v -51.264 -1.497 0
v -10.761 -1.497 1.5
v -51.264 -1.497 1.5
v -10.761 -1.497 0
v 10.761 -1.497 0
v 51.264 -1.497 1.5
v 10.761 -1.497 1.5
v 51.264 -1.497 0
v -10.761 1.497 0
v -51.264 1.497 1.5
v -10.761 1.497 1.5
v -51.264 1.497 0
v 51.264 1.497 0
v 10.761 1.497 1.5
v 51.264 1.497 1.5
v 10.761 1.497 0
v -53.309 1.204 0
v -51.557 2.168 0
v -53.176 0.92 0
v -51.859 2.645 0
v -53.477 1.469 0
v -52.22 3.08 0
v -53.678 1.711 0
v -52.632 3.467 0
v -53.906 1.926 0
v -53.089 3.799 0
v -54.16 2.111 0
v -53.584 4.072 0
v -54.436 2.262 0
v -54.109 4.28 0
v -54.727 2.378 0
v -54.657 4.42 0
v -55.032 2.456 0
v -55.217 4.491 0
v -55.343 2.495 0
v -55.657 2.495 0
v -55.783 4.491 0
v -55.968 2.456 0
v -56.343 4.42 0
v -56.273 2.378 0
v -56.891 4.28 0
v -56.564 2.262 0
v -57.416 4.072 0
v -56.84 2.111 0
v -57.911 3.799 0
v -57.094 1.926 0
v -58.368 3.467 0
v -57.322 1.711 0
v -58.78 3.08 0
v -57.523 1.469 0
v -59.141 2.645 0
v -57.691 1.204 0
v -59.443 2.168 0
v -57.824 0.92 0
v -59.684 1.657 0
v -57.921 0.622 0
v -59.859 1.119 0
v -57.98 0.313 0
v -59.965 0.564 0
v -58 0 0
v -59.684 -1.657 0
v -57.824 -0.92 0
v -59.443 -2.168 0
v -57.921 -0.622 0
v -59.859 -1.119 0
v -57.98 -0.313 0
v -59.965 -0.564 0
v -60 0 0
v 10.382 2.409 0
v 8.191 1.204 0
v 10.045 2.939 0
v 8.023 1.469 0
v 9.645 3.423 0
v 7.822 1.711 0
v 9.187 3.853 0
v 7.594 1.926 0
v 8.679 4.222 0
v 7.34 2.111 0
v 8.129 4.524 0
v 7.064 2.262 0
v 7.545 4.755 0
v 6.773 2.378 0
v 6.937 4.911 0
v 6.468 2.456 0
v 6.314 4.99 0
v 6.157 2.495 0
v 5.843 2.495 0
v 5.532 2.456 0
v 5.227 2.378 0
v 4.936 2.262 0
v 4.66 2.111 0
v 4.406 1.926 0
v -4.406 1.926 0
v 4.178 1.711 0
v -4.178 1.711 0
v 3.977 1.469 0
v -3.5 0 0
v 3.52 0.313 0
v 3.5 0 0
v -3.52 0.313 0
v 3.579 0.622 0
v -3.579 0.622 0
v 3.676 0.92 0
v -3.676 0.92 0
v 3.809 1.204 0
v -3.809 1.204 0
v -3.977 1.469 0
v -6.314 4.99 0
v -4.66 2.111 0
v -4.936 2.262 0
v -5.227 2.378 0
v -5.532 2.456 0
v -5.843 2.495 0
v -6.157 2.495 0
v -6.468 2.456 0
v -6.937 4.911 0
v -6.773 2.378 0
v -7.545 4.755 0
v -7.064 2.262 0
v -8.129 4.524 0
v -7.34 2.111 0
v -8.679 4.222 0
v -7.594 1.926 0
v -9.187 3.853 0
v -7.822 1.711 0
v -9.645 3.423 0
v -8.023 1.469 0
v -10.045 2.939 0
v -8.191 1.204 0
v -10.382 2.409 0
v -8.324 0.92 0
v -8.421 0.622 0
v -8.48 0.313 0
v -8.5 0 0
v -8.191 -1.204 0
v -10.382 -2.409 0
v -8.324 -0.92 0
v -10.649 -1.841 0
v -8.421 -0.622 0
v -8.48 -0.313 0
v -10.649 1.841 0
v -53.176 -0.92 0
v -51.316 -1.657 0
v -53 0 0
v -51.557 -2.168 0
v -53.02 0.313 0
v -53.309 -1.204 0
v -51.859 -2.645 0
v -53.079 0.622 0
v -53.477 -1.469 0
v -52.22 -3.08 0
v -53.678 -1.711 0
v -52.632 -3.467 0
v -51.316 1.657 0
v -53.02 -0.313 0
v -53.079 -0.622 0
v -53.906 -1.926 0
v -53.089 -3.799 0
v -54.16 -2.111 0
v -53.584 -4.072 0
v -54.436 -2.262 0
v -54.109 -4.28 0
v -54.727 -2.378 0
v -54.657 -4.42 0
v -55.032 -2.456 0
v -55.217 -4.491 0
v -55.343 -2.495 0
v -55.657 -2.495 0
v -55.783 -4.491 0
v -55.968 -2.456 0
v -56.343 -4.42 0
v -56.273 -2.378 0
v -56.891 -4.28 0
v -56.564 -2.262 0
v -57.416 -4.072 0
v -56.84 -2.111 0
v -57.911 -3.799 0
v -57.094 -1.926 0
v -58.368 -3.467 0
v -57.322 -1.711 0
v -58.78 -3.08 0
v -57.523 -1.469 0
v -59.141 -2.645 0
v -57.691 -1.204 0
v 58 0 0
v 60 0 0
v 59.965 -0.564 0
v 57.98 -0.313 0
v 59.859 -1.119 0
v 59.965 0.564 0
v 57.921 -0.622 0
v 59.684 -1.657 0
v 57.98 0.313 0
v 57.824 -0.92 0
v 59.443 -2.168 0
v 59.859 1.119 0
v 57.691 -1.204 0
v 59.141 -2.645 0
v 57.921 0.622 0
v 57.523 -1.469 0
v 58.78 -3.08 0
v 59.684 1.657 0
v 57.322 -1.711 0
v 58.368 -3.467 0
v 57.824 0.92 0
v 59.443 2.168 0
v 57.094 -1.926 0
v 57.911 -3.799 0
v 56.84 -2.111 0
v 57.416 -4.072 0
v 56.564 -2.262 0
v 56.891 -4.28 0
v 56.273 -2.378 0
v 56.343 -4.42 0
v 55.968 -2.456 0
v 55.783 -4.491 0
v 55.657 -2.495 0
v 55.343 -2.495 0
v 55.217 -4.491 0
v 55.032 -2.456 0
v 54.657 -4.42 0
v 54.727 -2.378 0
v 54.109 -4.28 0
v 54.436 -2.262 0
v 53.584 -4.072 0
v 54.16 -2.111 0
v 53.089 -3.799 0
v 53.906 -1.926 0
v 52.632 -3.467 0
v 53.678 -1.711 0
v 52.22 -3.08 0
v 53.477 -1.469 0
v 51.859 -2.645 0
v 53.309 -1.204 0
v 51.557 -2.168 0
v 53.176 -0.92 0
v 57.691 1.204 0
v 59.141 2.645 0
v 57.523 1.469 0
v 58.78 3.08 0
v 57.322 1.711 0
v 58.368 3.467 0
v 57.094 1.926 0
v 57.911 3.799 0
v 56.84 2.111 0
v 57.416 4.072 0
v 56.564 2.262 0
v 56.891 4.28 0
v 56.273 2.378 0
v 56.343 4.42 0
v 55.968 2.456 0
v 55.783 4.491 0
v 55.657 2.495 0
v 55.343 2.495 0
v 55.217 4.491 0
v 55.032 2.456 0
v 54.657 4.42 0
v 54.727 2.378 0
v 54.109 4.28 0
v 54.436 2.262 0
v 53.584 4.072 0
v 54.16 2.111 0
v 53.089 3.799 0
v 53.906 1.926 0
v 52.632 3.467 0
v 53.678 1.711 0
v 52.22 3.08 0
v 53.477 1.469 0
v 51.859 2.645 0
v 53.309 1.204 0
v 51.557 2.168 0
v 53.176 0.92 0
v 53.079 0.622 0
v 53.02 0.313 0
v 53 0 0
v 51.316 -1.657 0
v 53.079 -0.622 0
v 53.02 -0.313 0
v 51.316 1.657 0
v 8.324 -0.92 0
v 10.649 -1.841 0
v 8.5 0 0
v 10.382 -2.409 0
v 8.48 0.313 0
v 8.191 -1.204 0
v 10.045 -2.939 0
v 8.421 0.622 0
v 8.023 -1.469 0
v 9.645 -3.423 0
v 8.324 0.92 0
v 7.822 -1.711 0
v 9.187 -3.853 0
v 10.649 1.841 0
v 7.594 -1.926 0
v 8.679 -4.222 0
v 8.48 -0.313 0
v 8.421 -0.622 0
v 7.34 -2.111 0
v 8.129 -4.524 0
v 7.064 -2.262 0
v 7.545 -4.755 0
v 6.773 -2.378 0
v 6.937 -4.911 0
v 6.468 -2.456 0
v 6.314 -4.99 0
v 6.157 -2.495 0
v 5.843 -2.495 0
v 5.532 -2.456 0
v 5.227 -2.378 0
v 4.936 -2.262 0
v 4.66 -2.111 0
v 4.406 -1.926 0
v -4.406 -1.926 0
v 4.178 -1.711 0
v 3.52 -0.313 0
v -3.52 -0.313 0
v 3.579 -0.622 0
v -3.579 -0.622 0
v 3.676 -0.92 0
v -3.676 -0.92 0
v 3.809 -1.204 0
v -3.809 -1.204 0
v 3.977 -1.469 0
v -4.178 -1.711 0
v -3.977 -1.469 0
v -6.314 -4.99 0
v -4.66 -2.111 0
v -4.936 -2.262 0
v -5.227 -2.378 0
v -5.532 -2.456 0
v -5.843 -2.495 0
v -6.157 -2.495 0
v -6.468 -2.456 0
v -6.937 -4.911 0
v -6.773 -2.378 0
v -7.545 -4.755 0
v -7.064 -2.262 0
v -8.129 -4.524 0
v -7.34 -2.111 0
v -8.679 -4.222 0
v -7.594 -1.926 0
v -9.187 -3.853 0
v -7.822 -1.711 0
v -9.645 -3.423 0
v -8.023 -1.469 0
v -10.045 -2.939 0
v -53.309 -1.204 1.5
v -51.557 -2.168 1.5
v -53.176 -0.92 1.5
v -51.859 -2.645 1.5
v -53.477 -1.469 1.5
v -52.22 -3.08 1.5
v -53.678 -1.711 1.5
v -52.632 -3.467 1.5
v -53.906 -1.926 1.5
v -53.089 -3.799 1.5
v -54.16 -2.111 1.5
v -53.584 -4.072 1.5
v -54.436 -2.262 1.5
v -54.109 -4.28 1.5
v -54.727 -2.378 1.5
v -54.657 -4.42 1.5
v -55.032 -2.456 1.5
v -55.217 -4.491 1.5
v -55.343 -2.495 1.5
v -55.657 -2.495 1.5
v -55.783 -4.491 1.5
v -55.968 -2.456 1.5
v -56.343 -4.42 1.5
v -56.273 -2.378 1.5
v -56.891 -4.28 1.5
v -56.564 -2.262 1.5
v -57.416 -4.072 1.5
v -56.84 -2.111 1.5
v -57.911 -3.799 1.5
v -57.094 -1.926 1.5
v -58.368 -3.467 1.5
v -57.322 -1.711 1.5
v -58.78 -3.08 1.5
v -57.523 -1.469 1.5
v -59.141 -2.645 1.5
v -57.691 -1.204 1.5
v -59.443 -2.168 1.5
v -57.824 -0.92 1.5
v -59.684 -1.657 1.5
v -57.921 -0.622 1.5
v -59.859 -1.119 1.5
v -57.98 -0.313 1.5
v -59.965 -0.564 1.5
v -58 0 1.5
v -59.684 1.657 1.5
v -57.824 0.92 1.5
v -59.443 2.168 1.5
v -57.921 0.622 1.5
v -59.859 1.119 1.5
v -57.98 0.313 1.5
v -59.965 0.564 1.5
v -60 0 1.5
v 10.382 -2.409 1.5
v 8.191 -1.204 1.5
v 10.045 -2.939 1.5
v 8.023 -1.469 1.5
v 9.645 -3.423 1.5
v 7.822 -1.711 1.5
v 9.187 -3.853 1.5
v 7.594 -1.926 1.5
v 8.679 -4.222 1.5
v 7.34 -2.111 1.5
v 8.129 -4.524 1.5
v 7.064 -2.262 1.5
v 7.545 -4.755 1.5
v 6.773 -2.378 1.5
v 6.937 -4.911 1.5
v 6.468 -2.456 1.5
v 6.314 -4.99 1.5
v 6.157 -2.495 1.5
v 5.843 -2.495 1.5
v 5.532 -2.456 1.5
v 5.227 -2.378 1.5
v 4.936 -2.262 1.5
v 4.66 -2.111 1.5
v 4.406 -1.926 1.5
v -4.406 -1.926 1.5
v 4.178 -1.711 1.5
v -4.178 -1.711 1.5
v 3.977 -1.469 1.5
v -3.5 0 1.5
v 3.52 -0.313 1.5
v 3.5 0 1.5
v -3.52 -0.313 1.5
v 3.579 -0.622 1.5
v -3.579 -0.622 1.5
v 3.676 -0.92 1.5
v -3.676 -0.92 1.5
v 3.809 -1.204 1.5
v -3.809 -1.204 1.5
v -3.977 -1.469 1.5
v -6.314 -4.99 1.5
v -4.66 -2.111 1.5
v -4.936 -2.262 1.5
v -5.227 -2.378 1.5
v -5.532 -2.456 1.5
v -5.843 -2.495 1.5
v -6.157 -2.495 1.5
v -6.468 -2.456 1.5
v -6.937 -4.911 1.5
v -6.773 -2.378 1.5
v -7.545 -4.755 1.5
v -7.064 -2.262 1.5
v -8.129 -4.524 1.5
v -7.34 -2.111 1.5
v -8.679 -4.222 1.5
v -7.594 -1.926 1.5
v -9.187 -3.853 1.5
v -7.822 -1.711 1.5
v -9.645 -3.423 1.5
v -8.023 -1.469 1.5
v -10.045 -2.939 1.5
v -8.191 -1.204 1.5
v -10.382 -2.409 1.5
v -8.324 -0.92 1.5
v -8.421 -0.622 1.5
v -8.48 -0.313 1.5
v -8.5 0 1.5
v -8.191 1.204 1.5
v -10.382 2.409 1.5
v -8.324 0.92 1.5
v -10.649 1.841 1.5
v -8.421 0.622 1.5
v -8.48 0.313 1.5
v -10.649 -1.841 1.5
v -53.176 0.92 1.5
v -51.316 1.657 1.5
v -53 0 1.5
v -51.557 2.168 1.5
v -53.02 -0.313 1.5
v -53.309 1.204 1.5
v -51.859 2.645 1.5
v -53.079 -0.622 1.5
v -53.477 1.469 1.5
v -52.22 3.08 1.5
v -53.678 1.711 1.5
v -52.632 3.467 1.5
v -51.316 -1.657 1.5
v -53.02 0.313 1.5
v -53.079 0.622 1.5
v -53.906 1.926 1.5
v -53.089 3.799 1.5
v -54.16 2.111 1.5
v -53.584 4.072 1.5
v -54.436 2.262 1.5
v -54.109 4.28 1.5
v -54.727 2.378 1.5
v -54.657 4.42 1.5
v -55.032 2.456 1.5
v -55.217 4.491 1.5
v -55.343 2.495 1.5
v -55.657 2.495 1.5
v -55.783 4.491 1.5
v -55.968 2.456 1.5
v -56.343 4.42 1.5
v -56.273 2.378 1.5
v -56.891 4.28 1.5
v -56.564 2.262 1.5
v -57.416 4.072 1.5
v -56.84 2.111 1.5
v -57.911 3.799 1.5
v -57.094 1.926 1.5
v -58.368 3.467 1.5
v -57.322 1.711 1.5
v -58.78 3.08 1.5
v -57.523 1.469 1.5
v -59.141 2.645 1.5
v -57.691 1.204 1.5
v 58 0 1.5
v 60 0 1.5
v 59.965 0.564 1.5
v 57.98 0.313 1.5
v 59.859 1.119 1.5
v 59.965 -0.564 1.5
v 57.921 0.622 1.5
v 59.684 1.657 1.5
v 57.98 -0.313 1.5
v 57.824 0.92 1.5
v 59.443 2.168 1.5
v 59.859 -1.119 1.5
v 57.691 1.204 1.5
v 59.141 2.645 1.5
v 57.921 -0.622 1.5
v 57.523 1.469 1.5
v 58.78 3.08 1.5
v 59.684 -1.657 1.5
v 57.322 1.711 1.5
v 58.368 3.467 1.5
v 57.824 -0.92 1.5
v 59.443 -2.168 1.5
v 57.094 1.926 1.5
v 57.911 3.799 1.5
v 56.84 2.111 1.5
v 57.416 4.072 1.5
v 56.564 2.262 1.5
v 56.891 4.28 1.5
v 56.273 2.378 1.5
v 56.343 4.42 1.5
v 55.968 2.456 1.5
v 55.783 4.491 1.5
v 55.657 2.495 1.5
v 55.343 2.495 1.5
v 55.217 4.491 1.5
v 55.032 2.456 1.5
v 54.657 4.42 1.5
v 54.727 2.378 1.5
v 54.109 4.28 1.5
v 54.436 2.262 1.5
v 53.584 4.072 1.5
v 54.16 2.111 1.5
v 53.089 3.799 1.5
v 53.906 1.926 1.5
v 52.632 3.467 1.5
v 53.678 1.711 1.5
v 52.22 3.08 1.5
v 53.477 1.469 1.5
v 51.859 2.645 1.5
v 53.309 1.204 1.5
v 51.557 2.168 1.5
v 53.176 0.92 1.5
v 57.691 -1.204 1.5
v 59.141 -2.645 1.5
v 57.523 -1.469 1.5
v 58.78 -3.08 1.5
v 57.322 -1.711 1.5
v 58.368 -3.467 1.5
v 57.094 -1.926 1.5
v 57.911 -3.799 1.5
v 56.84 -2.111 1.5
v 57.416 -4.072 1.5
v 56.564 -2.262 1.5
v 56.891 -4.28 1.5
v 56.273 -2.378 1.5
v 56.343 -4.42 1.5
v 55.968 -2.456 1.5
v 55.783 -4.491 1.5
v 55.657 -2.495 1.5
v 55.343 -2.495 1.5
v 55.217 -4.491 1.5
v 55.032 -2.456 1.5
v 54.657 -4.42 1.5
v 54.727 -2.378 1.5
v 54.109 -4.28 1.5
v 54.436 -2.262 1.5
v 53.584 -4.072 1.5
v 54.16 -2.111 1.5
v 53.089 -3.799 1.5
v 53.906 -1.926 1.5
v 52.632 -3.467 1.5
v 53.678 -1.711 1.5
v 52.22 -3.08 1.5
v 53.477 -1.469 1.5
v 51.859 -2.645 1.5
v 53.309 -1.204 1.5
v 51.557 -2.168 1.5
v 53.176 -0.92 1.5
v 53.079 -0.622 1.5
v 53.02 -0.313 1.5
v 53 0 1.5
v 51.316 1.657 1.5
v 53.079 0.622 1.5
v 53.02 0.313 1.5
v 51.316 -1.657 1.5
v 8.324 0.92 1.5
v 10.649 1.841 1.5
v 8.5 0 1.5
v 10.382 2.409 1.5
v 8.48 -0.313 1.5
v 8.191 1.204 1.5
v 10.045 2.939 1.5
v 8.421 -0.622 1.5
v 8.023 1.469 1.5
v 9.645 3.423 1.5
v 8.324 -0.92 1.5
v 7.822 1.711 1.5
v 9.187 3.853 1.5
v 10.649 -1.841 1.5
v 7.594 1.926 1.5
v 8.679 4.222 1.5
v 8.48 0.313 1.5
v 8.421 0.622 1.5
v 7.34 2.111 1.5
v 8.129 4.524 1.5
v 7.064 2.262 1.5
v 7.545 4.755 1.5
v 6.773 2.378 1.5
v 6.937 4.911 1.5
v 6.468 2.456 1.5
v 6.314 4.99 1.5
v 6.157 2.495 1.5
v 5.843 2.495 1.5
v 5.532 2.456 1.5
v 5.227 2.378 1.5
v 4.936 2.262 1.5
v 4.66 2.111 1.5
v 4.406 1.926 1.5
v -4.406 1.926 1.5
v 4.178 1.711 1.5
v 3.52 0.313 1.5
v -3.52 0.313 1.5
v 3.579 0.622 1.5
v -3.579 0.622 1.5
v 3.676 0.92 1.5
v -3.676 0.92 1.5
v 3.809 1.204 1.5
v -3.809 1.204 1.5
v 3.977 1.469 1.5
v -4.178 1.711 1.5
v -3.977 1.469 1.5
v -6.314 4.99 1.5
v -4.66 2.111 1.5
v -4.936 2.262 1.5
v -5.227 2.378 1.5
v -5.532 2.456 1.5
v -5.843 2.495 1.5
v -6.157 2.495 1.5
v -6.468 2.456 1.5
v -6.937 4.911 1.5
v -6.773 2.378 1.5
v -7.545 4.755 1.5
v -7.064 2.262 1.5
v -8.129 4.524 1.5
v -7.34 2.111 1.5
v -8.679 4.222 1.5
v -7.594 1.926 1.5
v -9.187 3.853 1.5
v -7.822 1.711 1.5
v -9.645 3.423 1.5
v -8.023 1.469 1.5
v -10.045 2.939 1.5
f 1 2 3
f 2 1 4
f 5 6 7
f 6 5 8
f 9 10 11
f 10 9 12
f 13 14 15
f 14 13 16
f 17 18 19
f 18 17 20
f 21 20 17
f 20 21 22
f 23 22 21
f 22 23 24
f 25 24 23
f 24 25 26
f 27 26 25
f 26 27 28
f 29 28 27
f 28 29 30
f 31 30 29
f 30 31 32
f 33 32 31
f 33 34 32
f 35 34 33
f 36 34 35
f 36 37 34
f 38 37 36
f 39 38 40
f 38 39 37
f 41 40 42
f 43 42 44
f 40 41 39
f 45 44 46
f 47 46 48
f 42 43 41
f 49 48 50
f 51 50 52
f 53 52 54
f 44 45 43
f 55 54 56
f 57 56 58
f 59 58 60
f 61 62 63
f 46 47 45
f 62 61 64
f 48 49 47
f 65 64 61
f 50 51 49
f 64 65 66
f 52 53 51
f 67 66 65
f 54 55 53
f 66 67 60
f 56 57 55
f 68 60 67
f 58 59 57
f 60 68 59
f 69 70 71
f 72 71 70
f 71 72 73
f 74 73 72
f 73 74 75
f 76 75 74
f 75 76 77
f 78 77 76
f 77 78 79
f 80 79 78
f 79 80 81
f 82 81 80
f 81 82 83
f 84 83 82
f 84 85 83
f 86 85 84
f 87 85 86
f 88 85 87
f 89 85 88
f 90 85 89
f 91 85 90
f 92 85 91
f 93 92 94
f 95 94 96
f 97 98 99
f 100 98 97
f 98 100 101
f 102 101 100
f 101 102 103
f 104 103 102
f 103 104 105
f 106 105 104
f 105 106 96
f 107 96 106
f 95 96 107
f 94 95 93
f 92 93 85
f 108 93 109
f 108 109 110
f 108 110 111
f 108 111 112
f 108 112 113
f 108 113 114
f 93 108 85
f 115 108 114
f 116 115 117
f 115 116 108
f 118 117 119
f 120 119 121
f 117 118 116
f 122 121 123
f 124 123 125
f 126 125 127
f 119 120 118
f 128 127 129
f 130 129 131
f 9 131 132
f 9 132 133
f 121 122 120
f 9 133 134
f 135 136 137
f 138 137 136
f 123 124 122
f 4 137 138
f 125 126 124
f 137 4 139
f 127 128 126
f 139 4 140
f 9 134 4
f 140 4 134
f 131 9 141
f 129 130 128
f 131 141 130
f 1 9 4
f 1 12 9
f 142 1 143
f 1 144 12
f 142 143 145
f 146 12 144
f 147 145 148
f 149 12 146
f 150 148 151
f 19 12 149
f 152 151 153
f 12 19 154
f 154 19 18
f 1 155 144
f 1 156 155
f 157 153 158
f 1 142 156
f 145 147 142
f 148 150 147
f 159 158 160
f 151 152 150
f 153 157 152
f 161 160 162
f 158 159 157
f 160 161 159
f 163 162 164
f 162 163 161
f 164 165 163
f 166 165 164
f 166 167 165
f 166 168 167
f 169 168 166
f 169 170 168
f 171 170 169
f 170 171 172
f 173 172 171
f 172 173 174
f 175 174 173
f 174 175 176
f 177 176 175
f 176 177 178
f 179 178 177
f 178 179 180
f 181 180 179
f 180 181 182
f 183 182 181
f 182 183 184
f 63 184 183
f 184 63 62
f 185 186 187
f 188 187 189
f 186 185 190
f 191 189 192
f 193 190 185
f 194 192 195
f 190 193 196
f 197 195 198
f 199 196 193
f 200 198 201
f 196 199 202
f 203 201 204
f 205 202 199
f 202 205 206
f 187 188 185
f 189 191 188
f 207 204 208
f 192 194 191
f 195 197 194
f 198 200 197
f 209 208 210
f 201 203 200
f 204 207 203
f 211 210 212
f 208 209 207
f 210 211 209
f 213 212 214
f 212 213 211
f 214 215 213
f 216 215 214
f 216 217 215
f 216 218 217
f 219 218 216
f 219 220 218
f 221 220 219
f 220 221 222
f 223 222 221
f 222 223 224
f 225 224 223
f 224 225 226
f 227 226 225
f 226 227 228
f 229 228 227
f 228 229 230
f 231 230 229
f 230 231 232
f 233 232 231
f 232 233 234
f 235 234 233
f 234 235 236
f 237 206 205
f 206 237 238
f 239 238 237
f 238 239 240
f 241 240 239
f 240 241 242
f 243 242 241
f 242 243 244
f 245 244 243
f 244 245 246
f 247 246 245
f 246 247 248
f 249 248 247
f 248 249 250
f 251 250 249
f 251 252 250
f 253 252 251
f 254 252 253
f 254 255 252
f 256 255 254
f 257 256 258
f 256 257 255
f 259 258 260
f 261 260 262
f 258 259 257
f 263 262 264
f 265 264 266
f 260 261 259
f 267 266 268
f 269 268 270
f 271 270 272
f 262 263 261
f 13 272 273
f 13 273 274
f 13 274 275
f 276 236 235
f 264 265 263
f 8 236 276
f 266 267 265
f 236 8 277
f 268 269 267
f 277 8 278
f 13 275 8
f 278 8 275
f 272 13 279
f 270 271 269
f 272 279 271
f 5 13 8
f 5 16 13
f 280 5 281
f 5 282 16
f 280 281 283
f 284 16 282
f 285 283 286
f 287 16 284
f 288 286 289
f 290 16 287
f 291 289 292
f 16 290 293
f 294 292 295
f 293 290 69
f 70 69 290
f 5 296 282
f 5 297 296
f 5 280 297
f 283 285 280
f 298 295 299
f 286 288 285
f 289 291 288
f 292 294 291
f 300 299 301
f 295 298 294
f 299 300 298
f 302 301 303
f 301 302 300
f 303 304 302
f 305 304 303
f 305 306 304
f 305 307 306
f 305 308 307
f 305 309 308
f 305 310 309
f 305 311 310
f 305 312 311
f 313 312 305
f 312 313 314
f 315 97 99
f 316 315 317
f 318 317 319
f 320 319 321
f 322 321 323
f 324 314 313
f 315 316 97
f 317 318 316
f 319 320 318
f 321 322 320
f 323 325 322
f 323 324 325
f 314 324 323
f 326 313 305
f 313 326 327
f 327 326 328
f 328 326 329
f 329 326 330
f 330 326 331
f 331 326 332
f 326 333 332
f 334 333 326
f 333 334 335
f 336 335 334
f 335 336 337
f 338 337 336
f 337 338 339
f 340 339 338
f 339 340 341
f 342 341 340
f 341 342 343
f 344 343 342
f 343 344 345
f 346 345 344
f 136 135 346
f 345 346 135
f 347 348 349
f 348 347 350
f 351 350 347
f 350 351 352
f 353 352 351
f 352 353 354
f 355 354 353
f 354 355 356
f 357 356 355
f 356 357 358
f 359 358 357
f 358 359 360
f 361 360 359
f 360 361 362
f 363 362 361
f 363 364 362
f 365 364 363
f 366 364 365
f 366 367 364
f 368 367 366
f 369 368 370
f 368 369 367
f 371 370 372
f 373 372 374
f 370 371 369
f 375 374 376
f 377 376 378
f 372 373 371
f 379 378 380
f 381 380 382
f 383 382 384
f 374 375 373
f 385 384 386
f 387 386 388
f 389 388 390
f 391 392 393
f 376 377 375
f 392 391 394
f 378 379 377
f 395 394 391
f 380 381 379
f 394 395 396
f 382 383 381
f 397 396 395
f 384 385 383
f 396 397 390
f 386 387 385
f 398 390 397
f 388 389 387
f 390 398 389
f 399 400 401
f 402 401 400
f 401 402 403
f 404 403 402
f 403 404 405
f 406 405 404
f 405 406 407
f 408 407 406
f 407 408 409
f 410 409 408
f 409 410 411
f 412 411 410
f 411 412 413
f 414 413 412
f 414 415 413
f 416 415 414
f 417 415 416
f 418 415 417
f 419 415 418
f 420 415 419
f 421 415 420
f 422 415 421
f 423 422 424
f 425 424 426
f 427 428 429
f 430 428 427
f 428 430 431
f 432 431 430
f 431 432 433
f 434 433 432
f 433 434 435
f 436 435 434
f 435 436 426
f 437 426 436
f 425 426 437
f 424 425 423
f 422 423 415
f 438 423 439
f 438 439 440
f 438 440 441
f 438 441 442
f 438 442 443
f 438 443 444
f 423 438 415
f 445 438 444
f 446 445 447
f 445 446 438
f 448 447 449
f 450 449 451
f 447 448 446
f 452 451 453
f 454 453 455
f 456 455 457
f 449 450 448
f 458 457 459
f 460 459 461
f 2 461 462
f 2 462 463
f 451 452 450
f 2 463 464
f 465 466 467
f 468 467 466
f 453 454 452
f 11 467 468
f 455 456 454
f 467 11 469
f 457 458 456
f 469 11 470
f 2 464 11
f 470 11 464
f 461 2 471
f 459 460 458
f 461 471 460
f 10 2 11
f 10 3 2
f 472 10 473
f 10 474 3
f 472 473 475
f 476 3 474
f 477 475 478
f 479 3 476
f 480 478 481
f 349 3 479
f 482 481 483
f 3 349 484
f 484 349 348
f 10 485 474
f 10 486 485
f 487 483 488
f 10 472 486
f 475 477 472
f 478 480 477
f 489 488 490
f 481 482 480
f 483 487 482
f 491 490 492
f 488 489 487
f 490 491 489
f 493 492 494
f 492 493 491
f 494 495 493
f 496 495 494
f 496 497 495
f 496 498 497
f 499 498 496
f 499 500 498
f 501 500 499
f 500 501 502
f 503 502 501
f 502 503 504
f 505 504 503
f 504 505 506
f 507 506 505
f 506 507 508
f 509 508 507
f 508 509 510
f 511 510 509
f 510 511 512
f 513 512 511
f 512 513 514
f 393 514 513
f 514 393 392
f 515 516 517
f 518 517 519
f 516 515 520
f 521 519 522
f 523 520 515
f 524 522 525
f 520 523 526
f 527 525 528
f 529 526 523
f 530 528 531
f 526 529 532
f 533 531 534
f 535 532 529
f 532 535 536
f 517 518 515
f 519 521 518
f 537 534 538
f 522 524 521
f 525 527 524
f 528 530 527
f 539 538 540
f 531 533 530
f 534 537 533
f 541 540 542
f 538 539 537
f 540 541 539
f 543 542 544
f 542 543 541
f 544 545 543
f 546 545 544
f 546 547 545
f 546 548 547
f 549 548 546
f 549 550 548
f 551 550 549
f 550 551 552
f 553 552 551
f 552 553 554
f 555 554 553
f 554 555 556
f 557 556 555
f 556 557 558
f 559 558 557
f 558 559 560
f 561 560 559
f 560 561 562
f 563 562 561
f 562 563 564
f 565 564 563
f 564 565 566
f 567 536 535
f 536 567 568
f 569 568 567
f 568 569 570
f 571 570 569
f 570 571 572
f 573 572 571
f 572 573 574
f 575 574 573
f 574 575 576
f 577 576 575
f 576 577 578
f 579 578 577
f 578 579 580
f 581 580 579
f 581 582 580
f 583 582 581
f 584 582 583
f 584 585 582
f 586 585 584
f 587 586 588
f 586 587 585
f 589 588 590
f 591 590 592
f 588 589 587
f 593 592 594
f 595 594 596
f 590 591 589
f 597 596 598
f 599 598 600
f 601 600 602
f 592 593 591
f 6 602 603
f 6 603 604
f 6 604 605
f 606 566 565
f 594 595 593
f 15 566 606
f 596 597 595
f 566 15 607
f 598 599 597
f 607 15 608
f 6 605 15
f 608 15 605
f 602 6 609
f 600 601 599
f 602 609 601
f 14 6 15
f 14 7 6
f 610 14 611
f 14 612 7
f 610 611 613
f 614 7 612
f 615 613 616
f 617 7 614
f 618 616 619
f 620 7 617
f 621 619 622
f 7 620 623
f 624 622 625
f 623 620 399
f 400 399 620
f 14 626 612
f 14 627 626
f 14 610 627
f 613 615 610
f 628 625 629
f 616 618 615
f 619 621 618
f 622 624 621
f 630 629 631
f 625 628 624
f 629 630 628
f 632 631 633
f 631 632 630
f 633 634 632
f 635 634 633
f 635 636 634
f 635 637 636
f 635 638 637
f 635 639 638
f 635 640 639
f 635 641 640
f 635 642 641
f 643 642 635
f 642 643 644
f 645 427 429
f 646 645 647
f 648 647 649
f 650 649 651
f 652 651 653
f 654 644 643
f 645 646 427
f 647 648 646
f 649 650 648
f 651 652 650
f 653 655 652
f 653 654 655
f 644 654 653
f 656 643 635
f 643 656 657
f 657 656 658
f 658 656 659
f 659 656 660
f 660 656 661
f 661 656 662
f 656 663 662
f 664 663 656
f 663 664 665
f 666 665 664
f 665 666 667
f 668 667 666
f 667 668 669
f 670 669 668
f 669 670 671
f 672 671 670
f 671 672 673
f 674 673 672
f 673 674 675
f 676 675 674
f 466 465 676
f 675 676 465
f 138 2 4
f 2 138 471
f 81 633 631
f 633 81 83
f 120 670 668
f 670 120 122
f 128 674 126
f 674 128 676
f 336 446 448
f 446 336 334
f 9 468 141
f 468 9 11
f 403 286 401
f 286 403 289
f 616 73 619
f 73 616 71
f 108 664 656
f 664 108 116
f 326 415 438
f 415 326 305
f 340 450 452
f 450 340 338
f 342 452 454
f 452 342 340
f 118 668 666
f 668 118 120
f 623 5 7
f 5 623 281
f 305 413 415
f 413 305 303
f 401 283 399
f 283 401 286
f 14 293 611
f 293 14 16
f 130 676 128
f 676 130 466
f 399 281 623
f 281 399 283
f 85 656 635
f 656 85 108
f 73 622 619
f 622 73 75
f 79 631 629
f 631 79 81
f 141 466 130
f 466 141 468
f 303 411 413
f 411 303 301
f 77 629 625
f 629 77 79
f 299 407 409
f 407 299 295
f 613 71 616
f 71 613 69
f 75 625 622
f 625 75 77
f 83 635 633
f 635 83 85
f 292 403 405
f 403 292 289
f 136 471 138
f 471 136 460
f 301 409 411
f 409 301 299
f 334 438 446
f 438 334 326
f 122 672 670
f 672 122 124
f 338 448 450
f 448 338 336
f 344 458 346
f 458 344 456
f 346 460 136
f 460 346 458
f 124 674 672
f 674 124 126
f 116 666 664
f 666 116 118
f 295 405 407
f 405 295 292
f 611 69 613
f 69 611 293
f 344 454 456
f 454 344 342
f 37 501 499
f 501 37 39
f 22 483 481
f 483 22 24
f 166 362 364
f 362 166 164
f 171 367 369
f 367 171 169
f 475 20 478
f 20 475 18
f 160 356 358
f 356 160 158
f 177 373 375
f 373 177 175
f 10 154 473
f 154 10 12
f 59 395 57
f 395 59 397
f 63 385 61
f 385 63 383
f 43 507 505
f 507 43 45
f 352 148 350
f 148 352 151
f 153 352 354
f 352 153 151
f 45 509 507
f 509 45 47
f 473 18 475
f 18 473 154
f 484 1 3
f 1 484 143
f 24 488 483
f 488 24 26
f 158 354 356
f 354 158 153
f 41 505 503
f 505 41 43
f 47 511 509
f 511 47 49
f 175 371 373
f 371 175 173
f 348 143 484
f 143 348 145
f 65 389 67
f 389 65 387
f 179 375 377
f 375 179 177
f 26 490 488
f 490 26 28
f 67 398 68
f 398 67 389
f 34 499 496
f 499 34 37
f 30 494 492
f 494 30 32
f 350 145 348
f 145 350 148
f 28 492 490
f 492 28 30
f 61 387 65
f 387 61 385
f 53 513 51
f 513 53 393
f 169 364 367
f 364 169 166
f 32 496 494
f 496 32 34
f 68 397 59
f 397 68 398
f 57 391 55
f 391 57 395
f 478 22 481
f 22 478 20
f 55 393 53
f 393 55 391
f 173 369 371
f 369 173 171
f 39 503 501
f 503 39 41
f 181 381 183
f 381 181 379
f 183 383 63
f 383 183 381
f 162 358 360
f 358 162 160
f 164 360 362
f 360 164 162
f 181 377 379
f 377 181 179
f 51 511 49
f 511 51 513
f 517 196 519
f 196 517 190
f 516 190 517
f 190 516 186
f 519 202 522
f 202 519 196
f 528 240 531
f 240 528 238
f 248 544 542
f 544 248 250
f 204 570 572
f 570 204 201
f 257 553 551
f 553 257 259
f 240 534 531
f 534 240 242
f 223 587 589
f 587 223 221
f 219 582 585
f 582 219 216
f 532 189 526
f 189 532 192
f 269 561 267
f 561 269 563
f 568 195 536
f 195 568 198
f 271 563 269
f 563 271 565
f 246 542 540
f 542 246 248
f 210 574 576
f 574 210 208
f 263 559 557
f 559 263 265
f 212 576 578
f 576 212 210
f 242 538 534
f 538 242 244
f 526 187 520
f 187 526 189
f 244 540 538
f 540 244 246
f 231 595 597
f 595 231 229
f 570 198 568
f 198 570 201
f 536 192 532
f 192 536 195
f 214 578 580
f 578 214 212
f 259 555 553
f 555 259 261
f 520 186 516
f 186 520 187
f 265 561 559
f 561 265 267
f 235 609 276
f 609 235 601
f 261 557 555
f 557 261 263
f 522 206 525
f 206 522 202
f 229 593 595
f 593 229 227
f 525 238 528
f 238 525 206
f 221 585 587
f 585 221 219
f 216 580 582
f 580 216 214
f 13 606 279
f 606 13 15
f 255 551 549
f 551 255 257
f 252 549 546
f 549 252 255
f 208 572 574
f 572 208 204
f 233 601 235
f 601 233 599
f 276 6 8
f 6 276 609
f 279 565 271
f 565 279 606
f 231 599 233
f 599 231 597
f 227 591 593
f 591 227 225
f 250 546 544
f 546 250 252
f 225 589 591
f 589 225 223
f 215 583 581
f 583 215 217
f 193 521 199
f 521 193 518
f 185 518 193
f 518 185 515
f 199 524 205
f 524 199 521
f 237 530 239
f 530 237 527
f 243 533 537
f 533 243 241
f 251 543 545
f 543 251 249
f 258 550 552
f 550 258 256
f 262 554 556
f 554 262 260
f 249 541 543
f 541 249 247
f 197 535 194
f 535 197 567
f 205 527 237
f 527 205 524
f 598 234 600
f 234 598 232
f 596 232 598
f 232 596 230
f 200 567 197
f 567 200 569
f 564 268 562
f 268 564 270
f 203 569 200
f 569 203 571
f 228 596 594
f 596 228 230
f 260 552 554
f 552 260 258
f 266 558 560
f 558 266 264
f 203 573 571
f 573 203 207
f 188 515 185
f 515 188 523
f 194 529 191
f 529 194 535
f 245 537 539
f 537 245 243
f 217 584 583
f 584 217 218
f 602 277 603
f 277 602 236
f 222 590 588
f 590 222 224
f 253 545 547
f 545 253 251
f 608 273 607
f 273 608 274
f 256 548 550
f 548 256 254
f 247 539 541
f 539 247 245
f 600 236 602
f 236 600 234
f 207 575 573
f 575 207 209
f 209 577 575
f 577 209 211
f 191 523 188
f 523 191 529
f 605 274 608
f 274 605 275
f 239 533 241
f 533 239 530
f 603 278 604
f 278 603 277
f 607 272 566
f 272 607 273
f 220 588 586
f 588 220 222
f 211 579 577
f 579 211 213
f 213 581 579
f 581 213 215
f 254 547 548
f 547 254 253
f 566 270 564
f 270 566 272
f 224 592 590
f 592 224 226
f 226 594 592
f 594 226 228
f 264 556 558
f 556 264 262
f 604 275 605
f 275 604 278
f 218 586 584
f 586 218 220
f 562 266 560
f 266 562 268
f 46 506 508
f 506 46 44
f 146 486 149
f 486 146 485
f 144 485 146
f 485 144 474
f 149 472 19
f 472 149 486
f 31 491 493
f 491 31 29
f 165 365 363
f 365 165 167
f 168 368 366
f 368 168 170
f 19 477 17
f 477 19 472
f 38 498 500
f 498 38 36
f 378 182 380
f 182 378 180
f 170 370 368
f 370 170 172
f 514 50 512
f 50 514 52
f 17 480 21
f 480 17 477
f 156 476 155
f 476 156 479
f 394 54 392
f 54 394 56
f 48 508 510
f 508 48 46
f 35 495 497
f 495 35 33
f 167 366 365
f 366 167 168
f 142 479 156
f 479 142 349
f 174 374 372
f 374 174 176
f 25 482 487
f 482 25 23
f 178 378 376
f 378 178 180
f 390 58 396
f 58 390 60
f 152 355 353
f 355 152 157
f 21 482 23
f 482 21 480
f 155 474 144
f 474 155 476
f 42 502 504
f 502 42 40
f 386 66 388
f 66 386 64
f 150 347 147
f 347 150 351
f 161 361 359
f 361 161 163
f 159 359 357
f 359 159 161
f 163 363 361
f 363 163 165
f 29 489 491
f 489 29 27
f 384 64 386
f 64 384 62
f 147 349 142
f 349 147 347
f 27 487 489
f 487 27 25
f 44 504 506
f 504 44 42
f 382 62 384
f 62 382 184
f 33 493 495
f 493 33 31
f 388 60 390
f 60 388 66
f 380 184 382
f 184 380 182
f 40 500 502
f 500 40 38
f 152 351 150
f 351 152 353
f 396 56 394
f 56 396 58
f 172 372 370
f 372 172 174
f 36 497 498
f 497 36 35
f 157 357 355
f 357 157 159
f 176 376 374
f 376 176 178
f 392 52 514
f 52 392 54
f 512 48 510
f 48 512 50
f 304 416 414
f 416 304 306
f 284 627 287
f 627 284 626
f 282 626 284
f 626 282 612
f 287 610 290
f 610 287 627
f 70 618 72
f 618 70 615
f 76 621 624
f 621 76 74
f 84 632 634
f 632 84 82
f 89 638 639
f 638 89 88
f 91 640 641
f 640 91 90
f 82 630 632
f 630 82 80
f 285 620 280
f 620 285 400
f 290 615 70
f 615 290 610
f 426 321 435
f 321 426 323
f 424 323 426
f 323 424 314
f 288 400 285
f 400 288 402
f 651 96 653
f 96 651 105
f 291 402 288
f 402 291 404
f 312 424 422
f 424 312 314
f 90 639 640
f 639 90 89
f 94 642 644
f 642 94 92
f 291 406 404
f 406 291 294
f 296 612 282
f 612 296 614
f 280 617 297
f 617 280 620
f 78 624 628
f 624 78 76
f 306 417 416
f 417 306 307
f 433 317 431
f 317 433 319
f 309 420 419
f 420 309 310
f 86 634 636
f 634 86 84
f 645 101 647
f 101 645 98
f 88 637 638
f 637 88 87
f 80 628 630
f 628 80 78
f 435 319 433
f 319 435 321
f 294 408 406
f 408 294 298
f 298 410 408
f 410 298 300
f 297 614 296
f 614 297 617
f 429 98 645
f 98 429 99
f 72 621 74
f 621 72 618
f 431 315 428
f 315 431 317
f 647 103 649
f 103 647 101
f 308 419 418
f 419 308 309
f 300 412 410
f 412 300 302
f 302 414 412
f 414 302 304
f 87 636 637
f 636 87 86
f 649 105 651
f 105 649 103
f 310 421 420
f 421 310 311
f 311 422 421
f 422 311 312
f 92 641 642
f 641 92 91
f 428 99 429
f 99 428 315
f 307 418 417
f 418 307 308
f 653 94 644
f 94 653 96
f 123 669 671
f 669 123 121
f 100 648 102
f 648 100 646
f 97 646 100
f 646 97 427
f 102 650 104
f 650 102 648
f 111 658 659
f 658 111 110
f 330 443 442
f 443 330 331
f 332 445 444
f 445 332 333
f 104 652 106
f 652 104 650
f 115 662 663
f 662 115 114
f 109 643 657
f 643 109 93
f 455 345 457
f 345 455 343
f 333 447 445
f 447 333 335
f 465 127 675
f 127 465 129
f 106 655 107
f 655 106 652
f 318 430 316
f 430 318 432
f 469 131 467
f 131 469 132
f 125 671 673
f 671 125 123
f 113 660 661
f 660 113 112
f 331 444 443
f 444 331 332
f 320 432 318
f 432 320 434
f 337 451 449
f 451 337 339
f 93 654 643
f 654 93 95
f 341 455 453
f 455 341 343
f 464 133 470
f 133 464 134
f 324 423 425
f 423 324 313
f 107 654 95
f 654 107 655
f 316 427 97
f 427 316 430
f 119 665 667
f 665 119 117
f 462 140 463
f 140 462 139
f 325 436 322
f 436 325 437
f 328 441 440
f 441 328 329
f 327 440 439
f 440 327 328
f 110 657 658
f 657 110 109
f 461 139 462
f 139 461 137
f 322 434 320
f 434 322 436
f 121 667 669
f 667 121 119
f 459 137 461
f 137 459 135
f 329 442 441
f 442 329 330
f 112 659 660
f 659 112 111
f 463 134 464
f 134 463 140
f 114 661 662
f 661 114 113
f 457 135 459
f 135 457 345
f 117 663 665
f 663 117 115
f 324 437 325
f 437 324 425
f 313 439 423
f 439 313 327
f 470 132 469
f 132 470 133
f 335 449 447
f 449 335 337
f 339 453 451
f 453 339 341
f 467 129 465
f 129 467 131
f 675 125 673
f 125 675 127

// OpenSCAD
/* [Main Options] */
// Which part to render; in OpenSCAD, use "everything" to render all models at once
 part = "band"; // [clasp:Clasp,band:Elastic Band]

// Length of the elastic band
length = 115; // [80:120]


/* [Other Options] */

// Resolution of the round parts
resolution = 50; // [6:100]

// Elastic band's thickness in mm
height = 1.5;

// Elastic band's width in mm. This should probably be between 2.5mm and 4mm
width = 3;

// Diameter of the nubs/holes in the band in mm
nub_diameter = 5;

// Distance between the middle nubs/holes in mm
nub_offset = 6;

// Height of the nubs on the clasp; adjust to fit the thickness of the band
nub_height = 5.5;

// Thickness of the plastic piece on the clasp that connects the two nubs
nub_connection_height = 1.5;

module clasp() {
	// nubs
	translate([-nub_offset,0,nub_height/2]) cylinder(d=nub_diameter,h=nub_height,center=true, $fn=resolution);
	translate([nub_offset,0,nub_height/2]) cylinder(d=nub_diameter,h=nub_height,center=true, $fn=resolution);
	
	// nub ridges
	nub_top_diameter = nub_diameter+1;
	// left
	hull() {
		translate([-nub_offset-1,0.5,nub_height-(nub_connection_height/2)]) cylinder(d=nub_top_diameter,h=nub_connection_height,center=true, $fn=resolution);
		translate([-nub_offset+2,0.5,nub_height-(nub_connection_height/2)]) cylinder(d=nub_top_diameter,h=nub_connection_height,center=true, $fn=resolution);
	}
	// right
	hull() {
		translate([nub_offset-2,0.5,nub_height-(nub_connection_height/2)]) cylinder(d=nub_top_diameter,h=nub_connection_height,center=true, $fn=resolution);
		translate([nub_offset+1,0.5,nub_height-(nub_connection_height/2)]) cylinder(d=nub_top_diameter,h=nub_connection_height,center=true, $fn=resolution);
	}
	
	// nub connection
	hull() {
		translate([-nub_offset-2,0,nub_connection_height/2]) cylinder(d=nub_diameter,h=nub_connection_height,center=true, $fn=resolution);
		translate([nub_offset+2,0,nub_connection_height/2]) cylinder(d=nub_diameter,h=nub_connection_height,center=true, $fn=resolution);
	}
}
module hole() {
	cylinder(d=nub_diameter,h=height+4,center=true, $fn=resolution);
}
module elastic_band() {
	l = length - 4;
	
	difference() {
		union() {
			// band
			hull() {
				translate([l/2,0,height/2]) cylinder(d=width,h=height,center=true, $fn=resolution);
				translate([-l/2,0,height/2]) cylinder(d=width,h=height,center=true, $fn=resolution);
			}
			
			// center support
			hull() {
				translate([-nub_offset,0,height/2]) cylinder(d=nub_diameter+5,h=height,center=true, $fn=resolution);
				translate([nub_offset,0,height/2]) cylinder(d=nub_diameter+5,h=height,center=true, $fn=resolution);
			}
			
			// side support
			translate([-l/2,0,height/2]) cylinder(d=nub_diameter+4,h=height,center=true, $fn=resolution);
			// side support
			translate([l/2,0,height/2]) cylinder(d=nub_diameter+4,h=height,center=true, $fn=resolution);
		}
		
		// holes
		translate([l/2,0,height/2]) hole();
		translate([-l/2,0,height/2]) hole();
		translate([nub_offset,0,height/2]) hole();
		translate([-nub_offset,0,height/2]) hole();
	}
}


if(part == "everything" || part == "clasp") translate([0,20,nub_diameter/2]) rotate([90,0,0]) clasp();
if(part == "everything" || part == "band") elastic_band();
